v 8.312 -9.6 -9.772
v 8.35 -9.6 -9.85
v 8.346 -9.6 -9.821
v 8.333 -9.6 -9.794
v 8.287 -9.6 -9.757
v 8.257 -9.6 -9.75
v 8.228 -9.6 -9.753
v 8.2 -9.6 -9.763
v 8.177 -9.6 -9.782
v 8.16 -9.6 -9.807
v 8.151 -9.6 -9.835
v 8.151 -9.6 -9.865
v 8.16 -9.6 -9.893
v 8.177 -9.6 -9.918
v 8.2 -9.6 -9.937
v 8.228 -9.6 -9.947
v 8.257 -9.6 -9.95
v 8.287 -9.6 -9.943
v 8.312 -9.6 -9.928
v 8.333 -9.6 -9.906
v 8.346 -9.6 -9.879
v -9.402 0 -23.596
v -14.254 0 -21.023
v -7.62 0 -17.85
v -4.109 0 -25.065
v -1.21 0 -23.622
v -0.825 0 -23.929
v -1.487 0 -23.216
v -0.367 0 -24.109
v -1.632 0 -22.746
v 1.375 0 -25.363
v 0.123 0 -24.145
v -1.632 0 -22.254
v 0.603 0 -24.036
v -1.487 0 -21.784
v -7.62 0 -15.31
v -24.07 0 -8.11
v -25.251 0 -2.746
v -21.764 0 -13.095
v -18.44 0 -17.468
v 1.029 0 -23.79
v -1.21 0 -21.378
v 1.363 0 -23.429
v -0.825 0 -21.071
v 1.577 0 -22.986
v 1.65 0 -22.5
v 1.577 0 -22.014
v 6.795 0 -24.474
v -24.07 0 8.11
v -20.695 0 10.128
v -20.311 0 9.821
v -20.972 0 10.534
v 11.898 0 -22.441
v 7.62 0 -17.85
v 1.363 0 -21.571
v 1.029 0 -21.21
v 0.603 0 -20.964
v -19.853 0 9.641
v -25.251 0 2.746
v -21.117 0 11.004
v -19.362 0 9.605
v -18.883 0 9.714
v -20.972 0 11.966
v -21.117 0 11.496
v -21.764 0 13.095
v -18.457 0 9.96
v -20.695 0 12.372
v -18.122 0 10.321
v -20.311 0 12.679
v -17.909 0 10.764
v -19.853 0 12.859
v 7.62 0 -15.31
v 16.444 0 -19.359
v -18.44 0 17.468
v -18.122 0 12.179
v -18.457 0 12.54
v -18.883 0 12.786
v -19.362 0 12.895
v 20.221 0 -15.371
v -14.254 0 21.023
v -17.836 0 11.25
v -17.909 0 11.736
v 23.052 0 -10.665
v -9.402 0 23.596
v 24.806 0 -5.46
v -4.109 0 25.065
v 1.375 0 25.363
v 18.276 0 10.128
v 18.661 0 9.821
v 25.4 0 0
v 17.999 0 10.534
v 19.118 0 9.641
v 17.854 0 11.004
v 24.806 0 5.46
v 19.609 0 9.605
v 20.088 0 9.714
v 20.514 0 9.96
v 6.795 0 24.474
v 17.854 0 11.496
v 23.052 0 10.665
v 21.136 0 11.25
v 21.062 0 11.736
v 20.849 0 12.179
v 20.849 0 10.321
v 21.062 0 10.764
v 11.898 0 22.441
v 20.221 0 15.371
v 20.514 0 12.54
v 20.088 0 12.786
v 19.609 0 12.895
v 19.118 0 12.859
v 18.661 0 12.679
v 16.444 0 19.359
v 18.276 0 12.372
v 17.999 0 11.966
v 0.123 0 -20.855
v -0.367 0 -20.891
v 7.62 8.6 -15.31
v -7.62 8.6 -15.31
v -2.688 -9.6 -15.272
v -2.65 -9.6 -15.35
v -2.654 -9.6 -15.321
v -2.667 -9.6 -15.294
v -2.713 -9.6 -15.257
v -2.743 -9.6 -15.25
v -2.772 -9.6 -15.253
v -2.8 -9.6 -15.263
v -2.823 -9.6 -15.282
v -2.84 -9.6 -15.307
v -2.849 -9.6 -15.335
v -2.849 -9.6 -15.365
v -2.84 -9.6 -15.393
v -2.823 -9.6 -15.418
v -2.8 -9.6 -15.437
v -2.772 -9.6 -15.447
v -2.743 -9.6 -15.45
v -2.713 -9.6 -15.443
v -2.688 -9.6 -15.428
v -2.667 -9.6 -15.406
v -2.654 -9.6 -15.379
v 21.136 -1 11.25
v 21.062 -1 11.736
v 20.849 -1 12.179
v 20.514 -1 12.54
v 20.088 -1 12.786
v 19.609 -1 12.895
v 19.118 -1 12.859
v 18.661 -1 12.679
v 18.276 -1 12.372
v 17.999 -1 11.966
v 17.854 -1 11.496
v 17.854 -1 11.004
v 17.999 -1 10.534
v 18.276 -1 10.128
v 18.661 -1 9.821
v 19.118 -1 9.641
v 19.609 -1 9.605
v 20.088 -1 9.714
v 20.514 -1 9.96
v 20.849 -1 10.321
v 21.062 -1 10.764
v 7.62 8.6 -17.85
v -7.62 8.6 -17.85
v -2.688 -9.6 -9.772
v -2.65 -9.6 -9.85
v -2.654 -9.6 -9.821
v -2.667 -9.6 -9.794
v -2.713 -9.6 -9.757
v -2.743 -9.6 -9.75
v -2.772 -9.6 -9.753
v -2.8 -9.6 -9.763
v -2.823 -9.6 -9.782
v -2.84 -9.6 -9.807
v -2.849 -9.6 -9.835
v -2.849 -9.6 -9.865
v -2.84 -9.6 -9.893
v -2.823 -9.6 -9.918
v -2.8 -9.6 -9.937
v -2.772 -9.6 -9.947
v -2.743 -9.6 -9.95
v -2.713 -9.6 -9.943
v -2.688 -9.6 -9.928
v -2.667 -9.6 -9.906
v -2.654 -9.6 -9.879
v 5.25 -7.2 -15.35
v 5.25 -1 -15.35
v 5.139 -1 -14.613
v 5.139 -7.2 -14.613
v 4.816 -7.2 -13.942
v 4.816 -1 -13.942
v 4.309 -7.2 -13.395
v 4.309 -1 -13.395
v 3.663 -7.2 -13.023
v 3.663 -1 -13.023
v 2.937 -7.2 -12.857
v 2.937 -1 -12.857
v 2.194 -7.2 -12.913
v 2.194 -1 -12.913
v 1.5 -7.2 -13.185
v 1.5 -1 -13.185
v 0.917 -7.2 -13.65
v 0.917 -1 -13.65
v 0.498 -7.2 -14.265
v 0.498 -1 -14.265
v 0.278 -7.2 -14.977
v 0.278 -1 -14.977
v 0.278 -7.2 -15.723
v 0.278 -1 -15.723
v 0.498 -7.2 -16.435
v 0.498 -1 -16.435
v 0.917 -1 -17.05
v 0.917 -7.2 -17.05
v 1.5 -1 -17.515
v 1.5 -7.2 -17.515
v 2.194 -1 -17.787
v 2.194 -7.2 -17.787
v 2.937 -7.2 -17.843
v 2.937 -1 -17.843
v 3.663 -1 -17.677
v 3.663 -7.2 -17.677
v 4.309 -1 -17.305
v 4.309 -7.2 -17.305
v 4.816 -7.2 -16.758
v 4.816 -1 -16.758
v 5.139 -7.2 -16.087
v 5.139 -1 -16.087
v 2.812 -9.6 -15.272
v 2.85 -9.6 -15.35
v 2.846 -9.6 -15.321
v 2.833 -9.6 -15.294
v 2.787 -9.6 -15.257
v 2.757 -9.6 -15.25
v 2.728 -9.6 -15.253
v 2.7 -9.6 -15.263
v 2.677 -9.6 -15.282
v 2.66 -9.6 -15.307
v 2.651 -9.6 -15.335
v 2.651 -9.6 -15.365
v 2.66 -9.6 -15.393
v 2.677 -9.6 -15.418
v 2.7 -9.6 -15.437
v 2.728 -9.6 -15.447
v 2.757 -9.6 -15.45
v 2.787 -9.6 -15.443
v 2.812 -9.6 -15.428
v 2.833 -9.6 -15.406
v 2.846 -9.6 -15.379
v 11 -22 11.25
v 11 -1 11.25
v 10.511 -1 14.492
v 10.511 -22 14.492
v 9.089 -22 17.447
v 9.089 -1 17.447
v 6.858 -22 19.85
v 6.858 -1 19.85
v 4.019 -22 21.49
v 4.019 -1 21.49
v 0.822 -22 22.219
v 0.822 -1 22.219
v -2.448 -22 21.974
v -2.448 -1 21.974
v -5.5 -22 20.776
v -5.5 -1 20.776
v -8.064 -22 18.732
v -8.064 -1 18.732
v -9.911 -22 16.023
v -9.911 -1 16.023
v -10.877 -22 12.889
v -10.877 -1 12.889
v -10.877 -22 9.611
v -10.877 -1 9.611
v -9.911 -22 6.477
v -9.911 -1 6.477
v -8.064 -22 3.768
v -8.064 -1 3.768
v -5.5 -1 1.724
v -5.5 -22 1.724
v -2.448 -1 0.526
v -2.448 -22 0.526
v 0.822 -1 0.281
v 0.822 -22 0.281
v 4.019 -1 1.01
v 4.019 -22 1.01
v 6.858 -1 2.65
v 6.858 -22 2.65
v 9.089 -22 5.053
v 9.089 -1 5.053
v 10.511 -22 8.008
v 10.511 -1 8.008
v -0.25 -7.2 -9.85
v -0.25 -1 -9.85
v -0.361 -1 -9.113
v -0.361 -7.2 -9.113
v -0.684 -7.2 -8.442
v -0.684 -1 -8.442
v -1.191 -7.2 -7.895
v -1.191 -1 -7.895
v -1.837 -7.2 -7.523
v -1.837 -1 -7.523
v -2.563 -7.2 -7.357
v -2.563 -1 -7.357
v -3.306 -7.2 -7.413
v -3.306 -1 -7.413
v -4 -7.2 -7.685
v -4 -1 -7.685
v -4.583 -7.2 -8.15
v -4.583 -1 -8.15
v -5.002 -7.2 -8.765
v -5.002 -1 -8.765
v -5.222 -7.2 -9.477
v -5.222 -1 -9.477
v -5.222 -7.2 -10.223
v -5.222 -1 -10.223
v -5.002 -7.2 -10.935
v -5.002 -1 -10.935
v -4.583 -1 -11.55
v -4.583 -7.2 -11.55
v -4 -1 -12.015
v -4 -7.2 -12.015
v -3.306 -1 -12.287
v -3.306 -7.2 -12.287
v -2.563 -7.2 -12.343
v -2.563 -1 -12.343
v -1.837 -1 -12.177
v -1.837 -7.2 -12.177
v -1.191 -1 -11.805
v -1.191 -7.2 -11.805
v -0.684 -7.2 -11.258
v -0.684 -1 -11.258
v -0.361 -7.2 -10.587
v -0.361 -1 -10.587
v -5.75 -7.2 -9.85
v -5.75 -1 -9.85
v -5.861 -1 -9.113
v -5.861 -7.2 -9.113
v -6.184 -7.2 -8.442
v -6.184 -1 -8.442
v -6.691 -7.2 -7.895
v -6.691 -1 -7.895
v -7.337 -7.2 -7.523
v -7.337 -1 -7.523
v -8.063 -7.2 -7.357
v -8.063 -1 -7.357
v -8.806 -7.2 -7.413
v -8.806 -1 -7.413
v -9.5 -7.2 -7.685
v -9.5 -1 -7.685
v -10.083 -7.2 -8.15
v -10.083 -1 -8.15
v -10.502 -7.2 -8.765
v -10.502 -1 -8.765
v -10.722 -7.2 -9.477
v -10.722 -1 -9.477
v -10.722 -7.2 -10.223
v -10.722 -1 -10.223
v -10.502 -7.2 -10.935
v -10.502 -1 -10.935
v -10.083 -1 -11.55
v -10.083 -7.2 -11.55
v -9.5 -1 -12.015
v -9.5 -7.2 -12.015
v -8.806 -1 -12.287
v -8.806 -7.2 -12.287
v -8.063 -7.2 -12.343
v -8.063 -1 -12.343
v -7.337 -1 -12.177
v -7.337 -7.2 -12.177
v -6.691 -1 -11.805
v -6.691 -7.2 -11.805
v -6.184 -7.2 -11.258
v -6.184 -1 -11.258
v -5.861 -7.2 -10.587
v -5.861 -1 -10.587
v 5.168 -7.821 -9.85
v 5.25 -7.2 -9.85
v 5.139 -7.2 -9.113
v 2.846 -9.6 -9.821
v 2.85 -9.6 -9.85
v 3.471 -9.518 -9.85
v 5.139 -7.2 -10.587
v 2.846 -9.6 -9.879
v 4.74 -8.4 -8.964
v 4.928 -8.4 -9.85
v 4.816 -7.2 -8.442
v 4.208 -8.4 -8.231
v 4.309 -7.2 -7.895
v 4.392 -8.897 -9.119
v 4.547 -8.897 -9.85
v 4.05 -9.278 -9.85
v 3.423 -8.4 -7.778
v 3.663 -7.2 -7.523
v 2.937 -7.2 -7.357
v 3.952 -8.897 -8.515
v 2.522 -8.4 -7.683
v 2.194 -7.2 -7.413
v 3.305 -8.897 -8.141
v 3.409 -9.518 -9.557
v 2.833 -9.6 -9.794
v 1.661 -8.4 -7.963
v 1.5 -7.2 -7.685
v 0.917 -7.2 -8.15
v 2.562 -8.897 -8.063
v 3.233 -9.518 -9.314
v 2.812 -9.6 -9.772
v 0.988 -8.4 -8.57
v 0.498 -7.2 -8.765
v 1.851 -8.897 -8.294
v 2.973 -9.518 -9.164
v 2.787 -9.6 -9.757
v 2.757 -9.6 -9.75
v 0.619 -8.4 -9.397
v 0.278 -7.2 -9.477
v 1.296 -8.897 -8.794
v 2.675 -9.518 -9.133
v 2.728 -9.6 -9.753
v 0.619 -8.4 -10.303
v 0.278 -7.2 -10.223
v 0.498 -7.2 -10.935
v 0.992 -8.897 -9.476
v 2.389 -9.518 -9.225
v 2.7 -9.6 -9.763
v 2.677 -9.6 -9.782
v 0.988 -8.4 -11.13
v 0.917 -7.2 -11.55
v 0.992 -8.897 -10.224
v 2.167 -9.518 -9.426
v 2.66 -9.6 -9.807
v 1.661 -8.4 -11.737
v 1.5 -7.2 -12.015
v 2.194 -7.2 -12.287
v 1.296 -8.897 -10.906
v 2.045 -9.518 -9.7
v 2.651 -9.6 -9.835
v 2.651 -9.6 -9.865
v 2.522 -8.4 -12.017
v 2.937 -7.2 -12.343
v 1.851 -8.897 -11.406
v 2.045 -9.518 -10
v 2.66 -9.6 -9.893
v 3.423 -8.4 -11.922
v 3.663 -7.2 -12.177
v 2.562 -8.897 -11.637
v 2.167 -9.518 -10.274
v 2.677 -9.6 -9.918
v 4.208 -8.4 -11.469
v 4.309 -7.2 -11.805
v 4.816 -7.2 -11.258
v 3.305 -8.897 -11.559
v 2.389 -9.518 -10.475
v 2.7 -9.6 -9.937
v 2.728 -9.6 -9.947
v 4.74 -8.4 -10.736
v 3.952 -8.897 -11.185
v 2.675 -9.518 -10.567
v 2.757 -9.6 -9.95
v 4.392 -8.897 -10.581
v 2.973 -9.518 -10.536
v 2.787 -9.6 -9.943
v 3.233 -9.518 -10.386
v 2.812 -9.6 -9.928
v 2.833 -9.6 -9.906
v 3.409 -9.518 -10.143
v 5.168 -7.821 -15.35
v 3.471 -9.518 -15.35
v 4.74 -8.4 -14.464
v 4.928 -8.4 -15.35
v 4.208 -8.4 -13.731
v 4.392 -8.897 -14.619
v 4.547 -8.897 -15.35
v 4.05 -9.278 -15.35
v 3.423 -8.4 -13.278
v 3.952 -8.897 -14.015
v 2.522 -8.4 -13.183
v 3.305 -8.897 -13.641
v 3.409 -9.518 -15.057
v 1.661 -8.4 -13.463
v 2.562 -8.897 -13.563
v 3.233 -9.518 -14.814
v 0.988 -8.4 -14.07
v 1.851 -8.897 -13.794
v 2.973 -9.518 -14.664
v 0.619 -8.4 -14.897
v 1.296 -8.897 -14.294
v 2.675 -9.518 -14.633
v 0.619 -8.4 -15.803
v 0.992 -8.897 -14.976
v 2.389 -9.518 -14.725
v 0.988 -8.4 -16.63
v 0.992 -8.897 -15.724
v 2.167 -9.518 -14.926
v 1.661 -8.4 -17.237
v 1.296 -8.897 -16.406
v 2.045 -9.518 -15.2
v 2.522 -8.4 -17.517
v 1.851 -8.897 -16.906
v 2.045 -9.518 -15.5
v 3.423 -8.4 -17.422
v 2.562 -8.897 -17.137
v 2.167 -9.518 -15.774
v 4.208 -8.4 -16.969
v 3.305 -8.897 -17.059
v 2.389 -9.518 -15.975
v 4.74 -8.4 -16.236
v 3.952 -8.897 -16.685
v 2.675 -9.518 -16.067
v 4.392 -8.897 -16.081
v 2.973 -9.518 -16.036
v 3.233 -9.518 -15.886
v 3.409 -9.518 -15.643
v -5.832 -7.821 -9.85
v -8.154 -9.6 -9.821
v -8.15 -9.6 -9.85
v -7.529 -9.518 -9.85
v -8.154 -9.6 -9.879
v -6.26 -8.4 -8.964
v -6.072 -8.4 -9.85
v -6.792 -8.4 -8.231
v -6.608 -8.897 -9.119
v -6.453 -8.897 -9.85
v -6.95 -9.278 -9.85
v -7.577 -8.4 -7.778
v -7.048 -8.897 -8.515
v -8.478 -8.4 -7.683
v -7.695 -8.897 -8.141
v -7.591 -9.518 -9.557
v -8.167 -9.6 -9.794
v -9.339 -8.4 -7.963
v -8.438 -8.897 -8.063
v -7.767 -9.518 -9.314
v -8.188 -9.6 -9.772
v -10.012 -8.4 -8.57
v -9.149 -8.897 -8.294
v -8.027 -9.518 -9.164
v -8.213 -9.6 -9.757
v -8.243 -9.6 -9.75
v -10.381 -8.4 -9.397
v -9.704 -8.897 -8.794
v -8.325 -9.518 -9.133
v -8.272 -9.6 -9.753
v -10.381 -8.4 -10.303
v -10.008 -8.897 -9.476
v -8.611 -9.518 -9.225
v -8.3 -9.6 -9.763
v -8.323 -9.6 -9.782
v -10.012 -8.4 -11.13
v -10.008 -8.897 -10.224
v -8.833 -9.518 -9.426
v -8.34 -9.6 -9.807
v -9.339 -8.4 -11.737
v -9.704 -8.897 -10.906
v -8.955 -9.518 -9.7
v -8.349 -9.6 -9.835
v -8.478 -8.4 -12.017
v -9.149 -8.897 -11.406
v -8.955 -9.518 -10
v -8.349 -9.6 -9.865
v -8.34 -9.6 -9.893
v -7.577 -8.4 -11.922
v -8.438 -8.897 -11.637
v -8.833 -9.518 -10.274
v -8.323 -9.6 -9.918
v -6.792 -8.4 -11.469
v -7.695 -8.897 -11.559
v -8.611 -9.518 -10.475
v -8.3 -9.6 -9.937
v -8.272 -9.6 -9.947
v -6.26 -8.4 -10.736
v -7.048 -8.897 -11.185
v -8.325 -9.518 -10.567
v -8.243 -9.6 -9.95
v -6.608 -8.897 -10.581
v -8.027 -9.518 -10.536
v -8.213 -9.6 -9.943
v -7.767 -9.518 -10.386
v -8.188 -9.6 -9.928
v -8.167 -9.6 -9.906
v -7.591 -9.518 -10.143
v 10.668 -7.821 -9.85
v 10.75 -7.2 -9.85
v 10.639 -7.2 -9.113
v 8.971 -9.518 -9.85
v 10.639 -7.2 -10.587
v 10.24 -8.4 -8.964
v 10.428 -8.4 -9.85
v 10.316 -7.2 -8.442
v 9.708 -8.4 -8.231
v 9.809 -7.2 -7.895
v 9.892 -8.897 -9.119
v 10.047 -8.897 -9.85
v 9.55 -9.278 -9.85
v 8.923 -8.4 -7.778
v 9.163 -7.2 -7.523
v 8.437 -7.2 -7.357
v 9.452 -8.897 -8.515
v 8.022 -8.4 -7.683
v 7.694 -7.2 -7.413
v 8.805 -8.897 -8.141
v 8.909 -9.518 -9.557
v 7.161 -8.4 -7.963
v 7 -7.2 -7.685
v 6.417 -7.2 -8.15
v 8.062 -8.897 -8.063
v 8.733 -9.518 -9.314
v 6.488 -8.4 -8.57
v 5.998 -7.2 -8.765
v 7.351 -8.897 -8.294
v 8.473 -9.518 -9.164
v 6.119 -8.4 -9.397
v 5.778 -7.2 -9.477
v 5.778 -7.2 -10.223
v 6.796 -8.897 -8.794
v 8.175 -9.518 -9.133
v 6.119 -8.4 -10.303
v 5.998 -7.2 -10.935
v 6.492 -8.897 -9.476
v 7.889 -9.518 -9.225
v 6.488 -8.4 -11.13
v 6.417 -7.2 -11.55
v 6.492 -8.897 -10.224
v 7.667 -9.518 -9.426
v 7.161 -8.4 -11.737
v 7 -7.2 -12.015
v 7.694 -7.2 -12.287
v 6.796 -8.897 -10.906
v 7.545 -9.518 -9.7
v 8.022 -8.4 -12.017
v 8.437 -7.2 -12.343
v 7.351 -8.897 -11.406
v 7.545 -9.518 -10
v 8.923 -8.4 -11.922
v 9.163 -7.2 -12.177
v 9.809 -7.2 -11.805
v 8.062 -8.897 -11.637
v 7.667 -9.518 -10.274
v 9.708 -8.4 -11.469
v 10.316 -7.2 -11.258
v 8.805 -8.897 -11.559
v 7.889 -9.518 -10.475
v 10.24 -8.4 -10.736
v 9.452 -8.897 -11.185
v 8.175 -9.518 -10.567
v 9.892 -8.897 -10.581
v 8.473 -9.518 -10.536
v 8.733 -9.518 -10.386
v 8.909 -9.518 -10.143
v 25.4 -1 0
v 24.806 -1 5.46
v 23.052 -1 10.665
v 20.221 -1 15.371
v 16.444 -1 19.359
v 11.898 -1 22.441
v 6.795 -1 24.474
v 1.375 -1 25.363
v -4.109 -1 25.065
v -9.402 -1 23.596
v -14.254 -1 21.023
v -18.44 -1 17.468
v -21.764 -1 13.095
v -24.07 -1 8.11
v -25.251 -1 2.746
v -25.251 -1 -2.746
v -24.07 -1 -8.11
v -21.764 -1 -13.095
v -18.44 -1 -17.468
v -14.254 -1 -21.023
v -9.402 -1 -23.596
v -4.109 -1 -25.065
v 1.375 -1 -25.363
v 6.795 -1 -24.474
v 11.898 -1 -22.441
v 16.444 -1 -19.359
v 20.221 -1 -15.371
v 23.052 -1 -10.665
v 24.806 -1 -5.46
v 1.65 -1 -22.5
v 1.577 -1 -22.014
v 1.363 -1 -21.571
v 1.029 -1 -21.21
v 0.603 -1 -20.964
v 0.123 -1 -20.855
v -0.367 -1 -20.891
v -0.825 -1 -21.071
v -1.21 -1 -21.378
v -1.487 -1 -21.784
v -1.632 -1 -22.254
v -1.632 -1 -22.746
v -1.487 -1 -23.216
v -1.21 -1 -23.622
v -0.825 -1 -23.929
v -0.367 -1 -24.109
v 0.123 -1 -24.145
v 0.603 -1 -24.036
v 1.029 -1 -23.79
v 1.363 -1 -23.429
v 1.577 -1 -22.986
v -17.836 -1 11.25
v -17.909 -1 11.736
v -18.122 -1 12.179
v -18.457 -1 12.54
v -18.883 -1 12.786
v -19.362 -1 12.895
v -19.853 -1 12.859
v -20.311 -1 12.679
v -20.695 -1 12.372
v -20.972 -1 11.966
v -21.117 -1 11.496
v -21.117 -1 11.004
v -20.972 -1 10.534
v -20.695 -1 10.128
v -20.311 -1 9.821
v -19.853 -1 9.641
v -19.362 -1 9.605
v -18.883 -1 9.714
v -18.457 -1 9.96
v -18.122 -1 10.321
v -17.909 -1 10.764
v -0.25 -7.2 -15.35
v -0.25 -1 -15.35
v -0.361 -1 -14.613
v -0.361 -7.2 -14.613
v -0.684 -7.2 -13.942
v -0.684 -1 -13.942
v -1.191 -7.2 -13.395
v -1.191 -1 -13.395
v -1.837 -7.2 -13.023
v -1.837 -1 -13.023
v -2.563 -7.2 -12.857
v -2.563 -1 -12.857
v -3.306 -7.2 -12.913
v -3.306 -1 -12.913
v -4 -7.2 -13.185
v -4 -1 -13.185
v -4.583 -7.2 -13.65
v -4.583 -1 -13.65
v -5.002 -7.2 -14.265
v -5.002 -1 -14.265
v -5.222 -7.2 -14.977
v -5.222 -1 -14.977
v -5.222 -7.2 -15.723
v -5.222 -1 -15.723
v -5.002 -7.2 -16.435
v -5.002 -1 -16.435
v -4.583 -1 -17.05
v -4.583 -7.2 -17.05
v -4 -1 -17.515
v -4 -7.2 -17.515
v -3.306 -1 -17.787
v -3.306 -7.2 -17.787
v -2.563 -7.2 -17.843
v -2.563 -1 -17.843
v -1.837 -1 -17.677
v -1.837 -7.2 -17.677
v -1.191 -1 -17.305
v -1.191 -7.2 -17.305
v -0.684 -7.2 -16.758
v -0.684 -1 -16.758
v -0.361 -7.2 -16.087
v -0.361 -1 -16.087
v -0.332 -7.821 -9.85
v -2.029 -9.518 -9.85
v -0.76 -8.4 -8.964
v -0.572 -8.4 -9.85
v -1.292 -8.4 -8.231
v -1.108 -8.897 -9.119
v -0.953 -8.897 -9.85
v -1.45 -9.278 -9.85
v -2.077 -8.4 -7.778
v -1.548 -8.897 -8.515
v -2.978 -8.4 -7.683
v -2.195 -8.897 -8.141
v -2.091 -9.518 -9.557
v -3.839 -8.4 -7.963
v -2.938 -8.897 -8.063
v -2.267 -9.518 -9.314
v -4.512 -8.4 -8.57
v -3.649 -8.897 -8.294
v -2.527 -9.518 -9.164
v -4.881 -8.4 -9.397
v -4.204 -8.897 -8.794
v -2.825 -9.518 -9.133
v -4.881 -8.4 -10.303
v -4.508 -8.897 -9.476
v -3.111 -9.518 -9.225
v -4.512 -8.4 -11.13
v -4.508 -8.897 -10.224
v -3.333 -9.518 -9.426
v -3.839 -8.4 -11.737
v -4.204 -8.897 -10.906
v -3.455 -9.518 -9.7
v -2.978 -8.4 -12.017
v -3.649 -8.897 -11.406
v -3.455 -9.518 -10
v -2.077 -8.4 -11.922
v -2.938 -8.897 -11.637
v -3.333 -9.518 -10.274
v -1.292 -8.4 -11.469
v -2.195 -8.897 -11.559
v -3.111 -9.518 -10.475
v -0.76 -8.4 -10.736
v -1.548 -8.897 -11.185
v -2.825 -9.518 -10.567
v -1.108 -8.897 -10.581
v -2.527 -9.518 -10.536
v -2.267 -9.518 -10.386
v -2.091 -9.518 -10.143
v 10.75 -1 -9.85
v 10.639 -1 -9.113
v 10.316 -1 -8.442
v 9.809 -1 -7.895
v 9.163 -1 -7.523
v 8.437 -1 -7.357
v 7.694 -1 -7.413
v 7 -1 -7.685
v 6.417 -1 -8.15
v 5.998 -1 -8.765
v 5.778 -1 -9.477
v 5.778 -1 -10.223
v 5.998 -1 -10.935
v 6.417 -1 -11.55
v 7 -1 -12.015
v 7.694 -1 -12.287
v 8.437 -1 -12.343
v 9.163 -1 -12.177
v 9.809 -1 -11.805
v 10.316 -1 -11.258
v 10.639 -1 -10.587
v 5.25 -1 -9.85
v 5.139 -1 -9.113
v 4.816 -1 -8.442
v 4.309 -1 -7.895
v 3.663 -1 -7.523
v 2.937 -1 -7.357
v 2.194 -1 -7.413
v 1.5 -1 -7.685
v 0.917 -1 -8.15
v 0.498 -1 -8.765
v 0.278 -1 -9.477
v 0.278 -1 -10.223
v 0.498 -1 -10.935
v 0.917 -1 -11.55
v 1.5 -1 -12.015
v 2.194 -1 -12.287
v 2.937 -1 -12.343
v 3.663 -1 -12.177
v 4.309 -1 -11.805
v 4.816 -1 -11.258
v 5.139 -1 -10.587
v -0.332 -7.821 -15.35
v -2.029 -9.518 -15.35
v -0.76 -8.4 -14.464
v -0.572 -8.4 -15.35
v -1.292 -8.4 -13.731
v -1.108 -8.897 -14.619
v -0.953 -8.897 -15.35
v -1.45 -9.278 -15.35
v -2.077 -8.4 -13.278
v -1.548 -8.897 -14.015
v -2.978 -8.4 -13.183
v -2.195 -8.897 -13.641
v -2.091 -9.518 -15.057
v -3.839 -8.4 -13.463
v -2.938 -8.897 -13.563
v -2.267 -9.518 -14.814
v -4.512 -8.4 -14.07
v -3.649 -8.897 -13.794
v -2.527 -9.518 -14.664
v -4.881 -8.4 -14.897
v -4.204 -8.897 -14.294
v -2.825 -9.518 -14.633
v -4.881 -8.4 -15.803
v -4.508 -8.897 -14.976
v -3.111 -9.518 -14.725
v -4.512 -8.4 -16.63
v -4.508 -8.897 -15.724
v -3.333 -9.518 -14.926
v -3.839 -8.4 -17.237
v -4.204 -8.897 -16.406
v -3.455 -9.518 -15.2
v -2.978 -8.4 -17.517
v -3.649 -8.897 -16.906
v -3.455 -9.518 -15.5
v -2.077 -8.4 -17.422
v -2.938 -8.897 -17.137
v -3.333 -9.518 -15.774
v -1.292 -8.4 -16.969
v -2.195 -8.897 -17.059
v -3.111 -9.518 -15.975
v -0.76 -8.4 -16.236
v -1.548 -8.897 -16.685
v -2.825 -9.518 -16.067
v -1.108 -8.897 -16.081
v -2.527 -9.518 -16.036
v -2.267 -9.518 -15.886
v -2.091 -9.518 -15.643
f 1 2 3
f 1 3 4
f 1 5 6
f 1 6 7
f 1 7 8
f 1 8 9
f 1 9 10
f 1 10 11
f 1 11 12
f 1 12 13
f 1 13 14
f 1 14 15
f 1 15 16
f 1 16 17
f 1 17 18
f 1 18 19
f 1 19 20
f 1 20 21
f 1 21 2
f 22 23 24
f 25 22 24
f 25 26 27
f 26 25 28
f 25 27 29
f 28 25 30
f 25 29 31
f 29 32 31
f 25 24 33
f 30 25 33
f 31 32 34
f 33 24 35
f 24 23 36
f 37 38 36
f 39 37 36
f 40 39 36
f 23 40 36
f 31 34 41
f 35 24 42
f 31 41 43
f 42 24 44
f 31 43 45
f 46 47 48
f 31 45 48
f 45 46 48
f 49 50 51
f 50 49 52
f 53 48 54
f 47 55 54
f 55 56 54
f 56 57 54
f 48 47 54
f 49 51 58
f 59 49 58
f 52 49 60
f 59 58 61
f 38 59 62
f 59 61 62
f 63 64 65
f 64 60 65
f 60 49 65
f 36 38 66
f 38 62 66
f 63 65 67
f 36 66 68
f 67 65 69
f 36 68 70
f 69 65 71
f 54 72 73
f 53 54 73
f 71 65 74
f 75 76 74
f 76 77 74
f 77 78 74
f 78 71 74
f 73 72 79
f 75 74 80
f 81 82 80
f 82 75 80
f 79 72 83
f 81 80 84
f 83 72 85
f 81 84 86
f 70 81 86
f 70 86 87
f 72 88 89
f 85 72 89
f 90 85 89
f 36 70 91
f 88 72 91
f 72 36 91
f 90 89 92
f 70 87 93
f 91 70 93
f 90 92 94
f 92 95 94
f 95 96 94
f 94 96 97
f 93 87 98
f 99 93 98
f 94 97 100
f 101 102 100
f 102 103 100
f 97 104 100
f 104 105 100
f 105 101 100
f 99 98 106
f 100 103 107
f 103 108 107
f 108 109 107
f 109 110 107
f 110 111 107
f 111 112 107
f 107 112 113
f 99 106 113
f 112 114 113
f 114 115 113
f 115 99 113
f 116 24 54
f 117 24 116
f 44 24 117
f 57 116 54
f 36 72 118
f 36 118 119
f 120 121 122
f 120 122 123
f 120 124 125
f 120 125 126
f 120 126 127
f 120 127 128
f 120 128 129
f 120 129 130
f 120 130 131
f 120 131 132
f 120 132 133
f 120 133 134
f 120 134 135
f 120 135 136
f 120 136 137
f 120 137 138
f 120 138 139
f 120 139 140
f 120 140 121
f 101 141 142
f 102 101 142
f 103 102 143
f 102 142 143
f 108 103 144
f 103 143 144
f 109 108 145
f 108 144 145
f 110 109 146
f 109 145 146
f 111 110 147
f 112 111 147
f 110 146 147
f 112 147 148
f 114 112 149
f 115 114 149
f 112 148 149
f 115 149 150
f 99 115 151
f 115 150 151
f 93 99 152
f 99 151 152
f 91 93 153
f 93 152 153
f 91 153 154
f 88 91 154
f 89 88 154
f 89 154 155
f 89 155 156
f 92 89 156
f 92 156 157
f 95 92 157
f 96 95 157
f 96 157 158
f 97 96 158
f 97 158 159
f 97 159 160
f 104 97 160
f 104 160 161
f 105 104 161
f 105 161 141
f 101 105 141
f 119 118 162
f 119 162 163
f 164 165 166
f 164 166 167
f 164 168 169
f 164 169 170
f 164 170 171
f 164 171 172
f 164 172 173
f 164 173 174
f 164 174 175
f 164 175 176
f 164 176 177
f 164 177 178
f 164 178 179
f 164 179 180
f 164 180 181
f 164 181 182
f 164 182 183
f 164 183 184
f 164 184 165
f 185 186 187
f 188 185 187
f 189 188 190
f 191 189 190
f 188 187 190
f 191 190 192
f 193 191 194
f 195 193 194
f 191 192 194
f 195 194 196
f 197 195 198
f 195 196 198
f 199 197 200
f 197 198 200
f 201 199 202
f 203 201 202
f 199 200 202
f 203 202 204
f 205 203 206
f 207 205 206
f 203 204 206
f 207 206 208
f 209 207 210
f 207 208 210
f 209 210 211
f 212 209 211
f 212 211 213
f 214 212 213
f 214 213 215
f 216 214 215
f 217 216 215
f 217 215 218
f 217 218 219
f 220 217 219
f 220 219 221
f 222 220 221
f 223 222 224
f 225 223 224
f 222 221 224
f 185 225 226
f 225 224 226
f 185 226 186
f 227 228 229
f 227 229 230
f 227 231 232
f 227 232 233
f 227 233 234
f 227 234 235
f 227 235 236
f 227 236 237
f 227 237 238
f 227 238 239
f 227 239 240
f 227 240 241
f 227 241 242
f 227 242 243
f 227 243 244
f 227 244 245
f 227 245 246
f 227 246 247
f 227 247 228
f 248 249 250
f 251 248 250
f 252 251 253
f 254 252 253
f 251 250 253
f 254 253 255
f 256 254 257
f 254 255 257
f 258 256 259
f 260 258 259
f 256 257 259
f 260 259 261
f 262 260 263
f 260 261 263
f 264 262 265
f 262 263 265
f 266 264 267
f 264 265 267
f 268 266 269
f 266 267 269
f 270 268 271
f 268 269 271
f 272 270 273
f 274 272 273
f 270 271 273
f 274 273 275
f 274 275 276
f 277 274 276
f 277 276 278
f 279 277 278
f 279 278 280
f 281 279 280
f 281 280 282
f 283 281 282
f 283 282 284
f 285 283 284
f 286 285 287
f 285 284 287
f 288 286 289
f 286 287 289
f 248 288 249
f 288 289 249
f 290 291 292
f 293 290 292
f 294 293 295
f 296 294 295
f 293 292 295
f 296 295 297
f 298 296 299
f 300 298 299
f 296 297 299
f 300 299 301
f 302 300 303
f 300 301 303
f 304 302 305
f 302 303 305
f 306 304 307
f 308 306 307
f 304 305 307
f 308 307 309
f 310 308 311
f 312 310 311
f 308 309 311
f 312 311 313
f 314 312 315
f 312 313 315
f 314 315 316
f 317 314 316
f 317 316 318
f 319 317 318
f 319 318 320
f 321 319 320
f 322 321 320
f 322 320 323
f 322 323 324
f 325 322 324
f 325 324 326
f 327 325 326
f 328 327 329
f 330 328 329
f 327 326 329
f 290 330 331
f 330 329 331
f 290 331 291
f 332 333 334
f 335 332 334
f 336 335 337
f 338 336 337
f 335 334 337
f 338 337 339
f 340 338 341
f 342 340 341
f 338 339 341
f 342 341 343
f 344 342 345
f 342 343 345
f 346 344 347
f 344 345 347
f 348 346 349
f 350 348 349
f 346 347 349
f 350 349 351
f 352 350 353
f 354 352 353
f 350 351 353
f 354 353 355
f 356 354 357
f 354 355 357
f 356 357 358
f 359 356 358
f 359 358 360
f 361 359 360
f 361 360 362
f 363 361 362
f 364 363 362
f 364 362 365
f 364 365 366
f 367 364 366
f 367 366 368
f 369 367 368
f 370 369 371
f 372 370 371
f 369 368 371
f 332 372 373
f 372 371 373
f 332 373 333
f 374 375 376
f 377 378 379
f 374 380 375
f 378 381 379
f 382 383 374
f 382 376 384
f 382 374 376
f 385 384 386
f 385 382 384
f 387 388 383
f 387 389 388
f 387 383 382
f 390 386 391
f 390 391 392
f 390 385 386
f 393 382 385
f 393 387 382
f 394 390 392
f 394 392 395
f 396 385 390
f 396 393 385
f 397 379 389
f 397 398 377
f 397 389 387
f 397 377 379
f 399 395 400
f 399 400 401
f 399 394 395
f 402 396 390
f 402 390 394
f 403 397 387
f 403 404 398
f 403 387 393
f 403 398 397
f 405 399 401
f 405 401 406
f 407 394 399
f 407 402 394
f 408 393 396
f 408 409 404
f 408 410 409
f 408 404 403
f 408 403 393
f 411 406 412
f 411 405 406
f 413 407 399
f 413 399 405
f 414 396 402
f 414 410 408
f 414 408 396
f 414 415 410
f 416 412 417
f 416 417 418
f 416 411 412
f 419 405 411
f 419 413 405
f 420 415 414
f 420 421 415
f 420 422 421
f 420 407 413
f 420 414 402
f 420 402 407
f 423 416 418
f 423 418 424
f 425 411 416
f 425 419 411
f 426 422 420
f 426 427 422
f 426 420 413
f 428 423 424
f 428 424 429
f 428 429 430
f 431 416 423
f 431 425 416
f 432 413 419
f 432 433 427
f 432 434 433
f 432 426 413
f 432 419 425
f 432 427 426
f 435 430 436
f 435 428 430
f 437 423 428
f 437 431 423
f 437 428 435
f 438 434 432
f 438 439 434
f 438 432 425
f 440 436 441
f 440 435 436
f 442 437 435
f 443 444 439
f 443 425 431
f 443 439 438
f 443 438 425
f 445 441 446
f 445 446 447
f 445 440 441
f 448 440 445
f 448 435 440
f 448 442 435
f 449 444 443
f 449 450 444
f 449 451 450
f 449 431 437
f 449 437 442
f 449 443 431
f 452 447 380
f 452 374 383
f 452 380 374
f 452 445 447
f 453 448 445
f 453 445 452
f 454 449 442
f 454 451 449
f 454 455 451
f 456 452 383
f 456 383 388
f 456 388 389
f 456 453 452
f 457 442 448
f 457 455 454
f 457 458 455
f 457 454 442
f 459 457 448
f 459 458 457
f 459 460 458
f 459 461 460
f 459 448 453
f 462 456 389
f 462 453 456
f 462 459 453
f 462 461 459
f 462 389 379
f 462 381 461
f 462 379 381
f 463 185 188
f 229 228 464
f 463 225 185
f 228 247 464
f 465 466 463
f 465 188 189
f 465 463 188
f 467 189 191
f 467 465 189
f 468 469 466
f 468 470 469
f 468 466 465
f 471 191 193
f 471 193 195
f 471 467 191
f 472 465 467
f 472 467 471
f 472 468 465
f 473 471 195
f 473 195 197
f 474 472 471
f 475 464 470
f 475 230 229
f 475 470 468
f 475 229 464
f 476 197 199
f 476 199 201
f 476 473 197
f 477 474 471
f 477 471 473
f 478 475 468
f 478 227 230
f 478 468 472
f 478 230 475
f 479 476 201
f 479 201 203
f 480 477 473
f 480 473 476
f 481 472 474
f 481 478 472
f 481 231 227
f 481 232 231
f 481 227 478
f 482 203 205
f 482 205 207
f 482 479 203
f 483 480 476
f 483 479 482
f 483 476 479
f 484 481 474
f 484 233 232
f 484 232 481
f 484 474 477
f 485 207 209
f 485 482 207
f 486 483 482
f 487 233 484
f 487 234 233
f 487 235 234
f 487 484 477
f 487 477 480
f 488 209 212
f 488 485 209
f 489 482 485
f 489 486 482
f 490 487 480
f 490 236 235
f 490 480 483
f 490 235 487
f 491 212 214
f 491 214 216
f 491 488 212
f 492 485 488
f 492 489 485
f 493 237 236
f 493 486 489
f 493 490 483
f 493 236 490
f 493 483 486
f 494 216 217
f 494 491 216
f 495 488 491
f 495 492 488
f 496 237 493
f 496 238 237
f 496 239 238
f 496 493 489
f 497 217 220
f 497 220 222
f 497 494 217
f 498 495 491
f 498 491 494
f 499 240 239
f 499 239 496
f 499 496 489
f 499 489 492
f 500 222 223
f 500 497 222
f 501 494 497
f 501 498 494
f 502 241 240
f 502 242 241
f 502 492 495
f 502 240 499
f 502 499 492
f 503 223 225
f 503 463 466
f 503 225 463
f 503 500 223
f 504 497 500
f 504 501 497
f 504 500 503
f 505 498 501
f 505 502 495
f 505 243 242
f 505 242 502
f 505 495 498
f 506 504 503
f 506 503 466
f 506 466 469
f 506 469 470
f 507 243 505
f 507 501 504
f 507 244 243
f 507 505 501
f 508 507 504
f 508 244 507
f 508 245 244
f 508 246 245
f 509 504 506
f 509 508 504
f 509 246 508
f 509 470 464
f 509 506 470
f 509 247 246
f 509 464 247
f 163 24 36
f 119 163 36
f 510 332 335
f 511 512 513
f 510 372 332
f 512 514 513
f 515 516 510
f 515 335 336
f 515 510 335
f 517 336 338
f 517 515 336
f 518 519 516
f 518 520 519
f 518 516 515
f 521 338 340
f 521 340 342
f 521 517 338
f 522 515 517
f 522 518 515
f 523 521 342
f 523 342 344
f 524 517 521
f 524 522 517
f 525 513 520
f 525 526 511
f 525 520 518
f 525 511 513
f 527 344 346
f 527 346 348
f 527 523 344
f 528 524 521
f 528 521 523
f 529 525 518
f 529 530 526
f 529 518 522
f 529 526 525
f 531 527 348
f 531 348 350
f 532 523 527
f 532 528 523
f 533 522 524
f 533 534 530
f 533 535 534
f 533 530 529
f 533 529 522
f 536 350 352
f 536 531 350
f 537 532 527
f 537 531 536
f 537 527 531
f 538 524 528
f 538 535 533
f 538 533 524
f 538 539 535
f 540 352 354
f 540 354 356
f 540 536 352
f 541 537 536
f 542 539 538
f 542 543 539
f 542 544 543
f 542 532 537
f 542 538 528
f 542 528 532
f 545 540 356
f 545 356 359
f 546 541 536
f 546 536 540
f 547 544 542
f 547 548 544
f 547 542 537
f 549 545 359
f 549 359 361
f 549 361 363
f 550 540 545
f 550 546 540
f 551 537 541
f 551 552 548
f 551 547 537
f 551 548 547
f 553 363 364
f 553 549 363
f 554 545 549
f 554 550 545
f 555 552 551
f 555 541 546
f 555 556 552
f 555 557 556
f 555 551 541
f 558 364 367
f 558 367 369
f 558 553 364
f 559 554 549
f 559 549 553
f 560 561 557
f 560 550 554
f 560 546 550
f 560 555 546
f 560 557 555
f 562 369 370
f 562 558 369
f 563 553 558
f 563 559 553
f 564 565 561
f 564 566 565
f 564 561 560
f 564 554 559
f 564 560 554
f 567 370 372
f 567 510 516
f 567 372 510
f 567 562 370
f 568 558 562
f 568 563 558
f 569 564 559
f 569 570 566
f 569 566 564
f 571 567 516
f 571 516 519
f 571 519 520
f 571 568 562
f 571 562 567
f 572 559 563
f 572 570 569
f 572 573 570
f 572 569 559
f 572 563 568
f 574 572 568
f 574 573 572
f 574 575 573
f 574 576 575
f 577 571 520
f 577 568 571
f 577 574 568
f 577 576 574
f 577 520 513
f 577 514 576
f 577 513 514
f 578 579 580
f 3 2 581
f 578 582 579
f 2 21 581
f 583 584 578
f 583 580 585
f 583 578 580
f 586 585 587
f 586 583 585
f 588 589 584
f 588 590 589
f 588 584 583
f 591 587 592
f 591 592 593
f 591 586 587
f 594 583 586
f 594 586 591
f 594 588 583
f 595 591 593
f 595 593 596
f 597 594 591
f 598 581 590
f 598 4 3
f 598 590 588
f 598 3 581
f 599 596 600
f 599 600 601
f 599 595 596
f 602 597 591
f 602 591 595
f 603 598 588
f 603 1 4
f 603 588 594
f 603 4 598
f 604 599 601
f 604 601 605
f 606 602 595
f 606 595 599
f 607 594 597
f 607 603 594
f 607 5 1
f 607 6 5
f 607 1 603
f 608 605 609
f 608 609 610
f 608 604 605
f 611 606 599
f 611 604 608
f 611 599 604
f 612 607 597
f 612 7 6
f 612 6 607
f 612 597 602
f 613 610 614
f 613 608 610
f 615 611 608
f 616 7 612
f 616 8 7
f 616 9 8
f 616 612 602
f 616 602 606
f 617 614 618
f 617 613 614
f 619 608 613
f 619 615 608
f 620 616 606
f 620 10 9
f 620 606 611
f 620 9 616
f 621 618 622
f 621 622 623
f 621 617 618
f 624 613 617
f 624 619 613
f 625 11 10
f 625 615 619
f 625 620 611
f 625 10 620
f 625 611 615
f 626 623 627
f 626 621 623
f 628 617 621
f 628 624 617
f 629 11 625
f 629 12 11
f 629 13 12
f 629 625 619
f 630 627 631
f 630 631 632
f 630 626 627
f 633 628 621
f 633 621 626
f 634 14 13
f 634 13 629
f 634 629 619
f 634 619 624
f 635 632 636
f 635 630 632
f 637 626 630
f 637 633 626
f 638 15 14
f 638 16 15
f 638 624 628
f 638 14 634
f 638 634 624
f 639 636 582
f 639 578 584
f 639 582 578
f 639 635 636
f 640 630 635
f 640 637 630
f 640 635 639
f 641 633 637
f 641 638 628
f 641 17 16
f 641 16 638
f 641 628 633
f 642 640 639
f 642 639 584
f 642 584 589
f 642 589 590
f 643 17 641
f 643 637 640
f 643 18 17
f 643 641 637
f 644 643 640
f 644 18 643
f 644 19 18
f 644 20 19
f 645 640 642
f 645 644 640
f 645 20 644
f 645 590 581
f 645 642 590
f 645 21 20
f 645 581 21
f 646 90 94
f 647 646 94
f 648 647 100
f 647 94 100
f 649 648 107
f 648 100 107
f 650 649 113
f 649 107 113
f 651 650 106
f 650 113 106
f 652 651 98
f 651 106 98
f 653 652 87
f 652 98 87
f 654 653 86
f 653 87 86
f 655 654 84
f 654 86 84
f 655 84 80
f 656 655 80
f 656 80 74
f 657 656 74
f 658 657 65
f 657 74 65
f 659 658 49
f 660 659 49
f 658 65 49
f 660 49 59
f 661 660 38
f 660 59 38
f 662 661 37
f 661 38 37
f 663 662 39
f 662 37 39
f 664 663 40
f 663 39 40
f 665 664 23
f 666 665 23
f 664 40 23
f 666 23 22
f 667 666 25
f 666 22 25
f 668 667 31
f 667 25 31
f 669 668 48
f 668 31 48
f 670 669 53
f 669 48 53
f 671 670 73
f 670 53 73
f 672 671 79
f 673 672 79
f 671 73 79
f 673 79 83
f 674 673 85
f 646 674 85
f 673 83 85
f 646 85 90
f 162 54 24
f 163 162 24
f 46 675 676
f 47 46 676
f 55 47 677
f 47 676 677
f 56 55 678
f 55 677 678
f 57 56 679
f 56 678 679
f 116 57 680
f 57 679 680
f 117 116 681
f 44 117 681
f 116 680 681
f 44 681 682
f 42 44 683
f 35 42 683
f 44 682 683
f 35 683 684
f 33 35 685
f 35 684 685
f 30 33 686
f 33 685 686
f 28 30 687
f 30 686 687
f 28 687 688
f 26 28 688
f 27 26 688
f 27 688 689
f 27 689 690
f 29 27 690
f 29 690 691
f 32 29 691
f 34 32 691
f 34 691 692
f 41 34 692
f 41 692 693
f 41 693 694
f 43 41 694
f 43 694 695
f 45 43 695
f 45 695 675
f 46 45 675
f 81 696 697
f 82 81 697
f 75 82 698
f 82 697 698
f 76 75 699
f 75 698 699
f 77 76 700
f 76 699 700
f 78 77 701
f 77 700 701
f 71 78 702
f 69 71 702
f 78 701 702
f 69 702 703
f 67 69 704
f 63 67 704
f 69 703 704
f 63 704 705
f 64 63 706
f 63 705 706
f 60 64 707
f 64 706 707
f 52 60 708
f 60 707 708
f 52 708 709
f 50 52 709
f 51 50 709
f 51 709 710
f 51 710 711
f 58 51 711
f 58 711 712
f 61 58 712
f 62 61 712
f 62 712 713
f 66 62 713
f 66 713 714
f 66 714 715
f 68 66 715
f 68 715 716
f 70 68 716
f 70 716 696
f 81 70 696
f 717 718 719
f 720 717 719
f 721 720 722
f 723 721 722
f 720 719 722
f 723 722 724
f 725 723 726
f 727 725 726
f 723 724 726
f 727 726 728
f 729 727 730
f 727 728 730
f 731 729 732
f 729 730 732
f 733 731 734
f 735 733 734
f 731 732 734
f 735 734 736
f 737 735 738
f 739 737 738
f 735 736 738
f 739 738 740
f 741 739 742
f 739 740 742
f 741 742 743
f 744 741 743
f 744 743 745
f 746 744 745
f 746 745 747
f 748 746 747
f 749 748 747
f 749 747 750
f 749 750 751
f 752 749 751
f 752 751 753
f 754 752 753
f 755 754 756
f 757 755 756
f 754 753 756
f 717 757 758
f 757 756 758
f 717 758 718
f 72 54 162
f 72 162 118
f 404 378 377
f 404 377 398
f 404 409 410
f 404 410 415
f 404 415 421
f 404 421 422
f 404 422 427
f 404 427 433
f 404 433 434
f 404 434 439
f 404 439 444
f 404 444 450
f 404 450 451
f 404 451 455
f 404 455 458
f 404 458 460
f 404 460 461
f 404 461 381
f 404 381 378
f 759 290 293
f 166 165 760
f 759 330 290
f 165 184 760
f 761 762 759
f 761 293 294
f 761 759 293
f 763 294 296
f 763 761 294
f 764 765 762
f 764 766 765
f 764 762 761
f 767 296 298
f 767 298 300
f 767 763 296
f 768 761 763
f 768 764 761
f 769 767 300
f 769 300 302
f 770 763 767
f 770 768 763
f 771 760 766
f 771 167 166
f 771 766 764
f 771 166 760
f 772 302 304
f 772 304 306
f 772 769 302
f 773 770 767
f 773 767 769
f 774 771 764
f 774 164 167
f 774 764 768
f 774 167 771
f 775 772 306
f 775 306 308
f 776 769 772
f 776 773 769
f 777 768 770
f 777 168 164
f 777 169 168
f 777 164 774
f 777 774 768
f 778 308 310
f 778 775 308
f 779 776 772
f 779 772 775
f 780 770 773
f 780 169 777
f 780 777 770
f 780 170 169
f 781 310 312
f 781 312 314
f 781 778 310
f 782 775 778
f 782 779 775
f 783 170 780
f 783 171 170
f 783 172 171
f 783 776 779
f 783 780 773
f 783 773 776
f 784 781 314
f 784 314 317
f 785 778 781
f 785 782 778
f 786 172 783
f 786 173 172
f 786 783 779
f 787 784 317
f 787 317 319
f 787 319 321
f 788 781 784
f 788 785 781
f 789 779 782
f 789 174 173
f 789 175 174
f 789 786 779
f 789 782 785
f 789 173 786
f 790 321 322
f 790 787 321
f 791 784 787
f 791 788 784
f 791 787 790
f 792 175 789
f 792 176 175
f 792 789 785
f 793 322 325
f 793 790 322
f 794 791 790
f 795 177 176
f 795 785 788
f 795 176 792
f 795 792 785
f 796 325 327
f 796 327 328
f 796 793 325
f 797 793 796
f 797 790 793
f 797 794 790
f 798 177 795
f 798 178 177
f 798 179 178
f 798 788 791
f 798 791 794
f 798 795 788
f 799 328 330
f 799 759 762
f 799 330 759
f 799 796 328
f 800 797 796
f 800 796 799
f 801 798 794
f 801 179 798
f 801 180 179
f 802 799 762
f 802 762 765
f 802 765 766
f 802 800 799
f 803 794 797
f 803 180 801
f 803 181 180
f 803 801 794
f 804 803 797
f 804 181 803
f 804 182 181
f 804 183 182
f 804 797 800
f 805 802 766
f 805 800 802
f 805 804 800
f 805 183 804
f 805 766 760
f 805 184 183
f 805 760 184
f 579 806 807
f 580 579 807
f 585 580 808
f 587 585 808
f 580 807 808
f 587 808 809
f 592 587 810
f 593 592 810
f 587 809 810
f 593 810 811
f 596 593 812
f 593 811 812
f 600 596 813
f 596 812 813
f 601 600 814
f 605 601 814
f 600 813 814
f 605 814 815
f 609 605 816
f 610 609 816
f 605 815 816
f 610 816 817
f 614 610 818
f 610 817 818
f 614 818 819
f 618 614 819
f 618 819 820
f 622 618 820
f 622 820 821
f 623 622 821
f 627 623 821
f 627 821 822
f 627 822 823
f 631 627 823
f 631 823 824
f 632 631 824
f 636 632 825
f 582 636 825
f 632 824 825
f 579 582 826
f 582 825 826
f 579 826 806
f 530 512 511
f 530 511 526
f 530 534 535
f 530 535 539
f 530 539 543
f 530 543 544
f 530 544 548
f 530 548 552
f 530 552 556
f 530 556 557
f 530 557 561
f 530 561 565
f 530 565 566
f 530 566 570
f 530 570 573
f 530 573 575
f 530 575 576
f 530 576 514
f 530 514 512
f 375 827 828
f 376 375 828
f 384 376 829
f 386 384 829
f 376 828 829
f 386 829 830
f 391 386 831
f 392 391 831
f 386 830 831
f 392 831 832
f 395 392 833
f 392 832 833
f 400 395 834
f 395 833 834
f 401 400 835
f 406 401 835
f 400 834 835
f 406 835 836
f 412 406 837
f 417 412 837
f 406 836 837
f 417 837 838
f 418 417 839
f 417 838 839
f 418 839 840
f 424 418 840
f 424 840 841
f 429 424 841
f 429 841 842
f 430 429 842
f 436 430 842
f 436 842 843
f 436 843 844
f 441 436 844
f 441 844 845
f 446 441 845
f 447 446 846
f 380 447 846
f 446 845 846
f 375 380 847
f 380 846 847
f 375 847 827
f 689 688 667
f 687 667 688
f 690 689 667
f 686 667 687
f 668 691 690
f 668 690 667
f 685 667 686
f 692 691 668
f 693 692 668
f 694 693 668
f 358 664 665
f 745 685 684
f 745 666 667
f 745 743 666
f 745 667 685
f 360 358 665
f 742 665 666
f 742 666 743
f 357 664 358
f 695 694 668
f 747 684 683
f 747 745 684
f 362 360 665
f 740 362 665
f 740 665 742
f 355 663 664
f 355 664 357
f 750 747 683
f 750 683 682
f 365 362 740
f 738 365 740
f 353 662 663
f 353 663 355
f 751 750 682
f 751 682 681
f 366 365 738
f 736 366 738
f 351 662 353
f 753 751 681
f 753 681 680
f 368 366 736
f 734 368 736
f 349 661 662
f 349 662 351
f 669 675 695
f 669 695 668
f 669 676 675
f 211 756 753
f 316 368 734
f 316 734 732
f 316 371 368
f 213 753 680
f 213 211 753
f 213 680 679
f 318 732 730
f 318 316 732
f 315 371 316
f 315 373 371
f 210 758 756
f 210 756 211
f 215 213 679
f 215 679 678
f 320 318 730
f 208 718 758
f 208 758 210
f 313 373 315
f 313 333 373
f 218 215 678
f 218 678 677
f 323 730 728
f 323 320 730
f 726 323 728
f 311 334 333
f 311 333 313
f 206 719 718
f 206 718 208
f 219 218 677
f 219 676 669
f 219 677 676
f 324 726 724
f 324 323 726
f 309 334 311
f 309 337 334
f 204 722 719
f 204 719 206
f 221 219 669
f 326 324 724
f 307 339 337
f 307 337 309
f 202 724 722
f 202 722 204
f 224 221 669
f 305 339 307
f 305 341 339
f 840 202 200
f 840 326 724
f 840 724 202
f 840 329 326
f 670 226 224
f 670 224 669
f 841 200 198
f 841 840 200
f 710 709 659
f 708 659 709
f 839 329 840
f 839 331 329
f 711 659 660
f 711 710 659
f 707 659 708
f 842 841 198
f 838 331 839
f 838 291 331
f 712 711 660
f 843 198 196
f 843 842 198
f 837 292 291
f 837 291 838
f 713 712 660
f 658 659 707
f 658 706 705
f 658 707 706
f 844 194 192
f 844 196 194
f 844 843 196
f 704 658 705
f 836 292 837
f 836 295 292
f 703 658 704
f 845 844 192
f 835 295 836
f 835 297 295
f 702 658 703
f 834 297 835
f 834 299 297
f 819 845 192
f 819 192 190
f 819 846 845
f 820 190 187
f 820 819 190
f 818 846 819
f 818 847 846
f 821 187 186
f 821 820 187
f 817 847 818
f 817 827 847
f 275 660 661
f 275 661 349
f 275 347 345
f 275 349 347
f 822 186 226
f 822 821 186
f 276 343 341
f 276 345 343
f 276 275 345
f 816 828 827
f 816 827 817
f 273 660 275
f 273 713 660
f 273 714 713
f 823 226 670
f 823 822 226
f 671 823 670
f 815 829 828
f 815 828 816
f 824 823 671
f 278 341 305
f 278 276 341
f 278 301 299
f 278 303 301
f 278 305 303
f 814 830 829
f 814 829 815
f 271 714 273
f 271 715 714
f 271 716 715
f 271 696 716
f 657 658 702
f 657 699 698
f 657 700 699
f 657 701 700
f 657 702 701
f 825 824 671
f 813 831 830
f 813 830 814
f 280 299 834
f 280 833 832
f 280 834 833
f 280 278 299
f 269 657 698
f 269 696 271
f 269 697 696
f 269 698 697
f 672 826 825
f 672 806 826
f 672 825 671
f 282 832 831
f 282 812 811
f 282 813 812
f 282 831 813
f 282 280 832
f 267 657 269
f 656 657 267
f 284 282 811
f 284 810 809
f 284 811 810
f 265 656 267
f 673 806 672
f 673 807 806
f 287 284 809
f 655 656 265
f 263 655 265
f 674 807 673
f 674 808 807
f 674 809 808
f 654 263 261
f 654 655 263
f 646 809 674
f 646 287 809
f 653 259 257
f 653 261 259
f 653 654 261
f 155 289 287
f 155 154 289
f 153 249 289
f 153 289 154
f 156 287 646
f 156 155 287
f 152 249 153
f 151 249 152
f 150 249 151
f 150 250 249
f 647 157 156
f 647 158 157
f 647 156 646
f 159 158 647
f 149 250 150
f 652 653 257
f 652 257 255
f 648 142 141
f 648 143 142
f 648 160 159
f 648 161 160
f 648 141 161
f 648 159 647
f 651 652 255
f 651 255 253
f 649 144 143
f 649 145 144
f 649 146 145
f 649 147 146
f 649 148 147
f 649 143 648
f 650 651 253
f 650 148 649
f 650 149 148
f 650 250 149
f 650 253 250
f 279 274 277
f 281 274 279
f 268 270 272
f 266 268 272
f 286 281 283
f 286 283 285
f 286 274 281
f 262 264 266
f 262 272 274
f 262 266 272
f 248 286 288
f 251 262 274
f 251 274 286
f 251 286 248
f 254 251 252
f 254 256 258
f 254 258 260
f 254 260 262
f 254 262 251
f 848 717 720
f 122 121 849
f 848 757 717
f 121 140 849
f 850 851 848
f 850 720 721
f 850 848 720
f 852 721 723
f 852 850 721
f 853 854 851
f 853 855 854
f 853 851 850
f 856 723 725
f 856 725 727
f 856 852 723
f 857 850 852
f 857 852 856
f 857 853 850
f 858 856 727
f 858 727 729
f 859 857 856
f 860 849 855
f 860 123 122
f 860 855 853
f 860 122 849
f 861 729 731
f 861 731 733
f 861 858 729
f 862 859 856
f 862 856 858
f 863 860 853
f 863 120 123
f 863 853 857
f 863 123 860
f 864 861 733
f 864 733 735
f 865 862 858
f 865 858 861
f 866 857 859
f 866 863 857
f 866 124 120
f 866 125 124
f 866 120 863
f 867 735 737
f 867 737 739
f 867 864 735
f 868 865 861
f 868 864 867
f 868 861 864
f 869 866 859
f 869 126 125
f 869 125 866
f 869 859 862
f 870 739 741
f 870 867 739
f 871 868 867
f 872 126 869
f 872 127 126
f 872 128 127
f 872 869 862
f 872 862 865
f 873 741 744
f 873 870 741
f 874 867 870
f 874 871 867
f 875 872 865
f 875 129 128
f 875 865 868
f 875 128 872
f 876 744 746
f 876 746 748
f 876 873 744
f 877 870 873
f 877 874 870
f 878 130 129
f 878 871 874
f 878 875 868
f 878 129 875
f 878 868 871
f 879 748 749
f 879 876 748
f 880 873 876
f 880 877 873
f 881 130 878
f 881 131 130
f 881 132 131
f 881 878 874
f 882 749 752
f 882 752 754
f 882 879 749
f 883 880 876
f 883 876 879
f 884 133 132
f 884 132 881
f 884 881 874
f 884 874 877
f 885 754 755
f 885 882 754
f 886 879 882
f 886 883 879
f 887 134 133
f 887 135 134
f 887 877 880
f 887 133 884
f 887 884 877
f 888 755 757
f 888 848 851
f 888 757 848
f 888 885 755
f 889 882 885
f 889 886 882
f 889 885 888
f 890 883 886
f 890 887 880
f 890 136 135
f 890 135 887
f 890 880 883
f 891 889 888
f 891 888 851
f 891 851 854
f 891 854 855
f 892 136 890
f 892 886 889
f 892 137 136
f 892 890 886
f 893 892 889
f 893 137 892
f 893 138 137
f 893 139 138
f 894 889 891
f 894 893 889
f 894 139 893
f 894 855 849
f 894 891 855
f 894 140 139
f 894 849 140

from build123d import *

# Parameters (mm, degrees)
F0_R      = 25.4
F1_DEPTH  = 1
F2_R      = 1.65
F3_DEPTH  = 1.001
F4_R      = 11
F5_DEPTH  = 21
F6_R      = 2.5
F7_DEPTH  = 8.6
F8_R      = 2.4
F9_W      = 15.24
F9_H      = 2.54
F10_DEPTH = 8.6


with BuildPart() as f1:
    # F0 (on Front) → F1 (new body)
    with BuildSketch(Plane.XZ):
        Circle(F0_R)
    extrude(amount=F1_DEPTH)

    # F2 (on face) → F3 (cut, through all)
    with BuildSketch(Plane.XZ.offset(1)):
        with Locations((-19.485572, 11.25)):
            Circle(F2_R)
        with Locations((0, -22.5)):
            Circle(F2_R)
        with Locations((19.485572, 11.25)):
            Circle(F2_R)
    extrude(amount=-F3_DEPTH, mode=Mode.SUBTRACT)

    # F4 (on face) → F5 (join)
    with BuildSketch(Plane.XZ.offset(1)):
        with Locations((0, 11.25)):
            Circle(F4_R)
    extrude(amount=F5_DEPTH)

    # F6 (on face) → F7 (join)
    with BuildSketch(Plane.XZ.offset(1)):
        with Locations((-8.25, -9.85)):
            Circle(F6_R)
        with Locations((-2.75, -15.35)):
            Circle(F6_R)
        with Locations((-2.75, -9.85)):
            Circle(F6_R)
        with Locations((2.75, -15.35)):
            Circle(F6_R)
        with Locations((8.25, -9.85)):
            Circle(F6_R)
        with Locations((2.75, -9.85)):
            Circle(F6_R)
    extrude(amount=F7_DEPTH)

    # F8
    f8_edges = [f1.edges().sort_by_distance(p)[0] for p in [
        (-10.75, -9.6, -9.85),
        (-5.25, -9.6, -9.85),
        (0.25, -9.6, -9.85),
        (5.75, -9.6, -9.85),
        (0.25, -9.6, -15.35),
        (-5.25, -9.6, -15.35),
    ]]
    fillet(f8_edges, radius=F8_R)

    # F9 (on face) → F10 (join)
    with BuildSketch(Plane(origin=(0, 0, 0), x_dir=(-1, 0, 0), z_dir=(0, 1, 0))):
        with Locations((0, -16.58)):
            Rectangle(F9_W, F9_H)
    extrude(amount=F10_DEPTH)


solid = f1.part
